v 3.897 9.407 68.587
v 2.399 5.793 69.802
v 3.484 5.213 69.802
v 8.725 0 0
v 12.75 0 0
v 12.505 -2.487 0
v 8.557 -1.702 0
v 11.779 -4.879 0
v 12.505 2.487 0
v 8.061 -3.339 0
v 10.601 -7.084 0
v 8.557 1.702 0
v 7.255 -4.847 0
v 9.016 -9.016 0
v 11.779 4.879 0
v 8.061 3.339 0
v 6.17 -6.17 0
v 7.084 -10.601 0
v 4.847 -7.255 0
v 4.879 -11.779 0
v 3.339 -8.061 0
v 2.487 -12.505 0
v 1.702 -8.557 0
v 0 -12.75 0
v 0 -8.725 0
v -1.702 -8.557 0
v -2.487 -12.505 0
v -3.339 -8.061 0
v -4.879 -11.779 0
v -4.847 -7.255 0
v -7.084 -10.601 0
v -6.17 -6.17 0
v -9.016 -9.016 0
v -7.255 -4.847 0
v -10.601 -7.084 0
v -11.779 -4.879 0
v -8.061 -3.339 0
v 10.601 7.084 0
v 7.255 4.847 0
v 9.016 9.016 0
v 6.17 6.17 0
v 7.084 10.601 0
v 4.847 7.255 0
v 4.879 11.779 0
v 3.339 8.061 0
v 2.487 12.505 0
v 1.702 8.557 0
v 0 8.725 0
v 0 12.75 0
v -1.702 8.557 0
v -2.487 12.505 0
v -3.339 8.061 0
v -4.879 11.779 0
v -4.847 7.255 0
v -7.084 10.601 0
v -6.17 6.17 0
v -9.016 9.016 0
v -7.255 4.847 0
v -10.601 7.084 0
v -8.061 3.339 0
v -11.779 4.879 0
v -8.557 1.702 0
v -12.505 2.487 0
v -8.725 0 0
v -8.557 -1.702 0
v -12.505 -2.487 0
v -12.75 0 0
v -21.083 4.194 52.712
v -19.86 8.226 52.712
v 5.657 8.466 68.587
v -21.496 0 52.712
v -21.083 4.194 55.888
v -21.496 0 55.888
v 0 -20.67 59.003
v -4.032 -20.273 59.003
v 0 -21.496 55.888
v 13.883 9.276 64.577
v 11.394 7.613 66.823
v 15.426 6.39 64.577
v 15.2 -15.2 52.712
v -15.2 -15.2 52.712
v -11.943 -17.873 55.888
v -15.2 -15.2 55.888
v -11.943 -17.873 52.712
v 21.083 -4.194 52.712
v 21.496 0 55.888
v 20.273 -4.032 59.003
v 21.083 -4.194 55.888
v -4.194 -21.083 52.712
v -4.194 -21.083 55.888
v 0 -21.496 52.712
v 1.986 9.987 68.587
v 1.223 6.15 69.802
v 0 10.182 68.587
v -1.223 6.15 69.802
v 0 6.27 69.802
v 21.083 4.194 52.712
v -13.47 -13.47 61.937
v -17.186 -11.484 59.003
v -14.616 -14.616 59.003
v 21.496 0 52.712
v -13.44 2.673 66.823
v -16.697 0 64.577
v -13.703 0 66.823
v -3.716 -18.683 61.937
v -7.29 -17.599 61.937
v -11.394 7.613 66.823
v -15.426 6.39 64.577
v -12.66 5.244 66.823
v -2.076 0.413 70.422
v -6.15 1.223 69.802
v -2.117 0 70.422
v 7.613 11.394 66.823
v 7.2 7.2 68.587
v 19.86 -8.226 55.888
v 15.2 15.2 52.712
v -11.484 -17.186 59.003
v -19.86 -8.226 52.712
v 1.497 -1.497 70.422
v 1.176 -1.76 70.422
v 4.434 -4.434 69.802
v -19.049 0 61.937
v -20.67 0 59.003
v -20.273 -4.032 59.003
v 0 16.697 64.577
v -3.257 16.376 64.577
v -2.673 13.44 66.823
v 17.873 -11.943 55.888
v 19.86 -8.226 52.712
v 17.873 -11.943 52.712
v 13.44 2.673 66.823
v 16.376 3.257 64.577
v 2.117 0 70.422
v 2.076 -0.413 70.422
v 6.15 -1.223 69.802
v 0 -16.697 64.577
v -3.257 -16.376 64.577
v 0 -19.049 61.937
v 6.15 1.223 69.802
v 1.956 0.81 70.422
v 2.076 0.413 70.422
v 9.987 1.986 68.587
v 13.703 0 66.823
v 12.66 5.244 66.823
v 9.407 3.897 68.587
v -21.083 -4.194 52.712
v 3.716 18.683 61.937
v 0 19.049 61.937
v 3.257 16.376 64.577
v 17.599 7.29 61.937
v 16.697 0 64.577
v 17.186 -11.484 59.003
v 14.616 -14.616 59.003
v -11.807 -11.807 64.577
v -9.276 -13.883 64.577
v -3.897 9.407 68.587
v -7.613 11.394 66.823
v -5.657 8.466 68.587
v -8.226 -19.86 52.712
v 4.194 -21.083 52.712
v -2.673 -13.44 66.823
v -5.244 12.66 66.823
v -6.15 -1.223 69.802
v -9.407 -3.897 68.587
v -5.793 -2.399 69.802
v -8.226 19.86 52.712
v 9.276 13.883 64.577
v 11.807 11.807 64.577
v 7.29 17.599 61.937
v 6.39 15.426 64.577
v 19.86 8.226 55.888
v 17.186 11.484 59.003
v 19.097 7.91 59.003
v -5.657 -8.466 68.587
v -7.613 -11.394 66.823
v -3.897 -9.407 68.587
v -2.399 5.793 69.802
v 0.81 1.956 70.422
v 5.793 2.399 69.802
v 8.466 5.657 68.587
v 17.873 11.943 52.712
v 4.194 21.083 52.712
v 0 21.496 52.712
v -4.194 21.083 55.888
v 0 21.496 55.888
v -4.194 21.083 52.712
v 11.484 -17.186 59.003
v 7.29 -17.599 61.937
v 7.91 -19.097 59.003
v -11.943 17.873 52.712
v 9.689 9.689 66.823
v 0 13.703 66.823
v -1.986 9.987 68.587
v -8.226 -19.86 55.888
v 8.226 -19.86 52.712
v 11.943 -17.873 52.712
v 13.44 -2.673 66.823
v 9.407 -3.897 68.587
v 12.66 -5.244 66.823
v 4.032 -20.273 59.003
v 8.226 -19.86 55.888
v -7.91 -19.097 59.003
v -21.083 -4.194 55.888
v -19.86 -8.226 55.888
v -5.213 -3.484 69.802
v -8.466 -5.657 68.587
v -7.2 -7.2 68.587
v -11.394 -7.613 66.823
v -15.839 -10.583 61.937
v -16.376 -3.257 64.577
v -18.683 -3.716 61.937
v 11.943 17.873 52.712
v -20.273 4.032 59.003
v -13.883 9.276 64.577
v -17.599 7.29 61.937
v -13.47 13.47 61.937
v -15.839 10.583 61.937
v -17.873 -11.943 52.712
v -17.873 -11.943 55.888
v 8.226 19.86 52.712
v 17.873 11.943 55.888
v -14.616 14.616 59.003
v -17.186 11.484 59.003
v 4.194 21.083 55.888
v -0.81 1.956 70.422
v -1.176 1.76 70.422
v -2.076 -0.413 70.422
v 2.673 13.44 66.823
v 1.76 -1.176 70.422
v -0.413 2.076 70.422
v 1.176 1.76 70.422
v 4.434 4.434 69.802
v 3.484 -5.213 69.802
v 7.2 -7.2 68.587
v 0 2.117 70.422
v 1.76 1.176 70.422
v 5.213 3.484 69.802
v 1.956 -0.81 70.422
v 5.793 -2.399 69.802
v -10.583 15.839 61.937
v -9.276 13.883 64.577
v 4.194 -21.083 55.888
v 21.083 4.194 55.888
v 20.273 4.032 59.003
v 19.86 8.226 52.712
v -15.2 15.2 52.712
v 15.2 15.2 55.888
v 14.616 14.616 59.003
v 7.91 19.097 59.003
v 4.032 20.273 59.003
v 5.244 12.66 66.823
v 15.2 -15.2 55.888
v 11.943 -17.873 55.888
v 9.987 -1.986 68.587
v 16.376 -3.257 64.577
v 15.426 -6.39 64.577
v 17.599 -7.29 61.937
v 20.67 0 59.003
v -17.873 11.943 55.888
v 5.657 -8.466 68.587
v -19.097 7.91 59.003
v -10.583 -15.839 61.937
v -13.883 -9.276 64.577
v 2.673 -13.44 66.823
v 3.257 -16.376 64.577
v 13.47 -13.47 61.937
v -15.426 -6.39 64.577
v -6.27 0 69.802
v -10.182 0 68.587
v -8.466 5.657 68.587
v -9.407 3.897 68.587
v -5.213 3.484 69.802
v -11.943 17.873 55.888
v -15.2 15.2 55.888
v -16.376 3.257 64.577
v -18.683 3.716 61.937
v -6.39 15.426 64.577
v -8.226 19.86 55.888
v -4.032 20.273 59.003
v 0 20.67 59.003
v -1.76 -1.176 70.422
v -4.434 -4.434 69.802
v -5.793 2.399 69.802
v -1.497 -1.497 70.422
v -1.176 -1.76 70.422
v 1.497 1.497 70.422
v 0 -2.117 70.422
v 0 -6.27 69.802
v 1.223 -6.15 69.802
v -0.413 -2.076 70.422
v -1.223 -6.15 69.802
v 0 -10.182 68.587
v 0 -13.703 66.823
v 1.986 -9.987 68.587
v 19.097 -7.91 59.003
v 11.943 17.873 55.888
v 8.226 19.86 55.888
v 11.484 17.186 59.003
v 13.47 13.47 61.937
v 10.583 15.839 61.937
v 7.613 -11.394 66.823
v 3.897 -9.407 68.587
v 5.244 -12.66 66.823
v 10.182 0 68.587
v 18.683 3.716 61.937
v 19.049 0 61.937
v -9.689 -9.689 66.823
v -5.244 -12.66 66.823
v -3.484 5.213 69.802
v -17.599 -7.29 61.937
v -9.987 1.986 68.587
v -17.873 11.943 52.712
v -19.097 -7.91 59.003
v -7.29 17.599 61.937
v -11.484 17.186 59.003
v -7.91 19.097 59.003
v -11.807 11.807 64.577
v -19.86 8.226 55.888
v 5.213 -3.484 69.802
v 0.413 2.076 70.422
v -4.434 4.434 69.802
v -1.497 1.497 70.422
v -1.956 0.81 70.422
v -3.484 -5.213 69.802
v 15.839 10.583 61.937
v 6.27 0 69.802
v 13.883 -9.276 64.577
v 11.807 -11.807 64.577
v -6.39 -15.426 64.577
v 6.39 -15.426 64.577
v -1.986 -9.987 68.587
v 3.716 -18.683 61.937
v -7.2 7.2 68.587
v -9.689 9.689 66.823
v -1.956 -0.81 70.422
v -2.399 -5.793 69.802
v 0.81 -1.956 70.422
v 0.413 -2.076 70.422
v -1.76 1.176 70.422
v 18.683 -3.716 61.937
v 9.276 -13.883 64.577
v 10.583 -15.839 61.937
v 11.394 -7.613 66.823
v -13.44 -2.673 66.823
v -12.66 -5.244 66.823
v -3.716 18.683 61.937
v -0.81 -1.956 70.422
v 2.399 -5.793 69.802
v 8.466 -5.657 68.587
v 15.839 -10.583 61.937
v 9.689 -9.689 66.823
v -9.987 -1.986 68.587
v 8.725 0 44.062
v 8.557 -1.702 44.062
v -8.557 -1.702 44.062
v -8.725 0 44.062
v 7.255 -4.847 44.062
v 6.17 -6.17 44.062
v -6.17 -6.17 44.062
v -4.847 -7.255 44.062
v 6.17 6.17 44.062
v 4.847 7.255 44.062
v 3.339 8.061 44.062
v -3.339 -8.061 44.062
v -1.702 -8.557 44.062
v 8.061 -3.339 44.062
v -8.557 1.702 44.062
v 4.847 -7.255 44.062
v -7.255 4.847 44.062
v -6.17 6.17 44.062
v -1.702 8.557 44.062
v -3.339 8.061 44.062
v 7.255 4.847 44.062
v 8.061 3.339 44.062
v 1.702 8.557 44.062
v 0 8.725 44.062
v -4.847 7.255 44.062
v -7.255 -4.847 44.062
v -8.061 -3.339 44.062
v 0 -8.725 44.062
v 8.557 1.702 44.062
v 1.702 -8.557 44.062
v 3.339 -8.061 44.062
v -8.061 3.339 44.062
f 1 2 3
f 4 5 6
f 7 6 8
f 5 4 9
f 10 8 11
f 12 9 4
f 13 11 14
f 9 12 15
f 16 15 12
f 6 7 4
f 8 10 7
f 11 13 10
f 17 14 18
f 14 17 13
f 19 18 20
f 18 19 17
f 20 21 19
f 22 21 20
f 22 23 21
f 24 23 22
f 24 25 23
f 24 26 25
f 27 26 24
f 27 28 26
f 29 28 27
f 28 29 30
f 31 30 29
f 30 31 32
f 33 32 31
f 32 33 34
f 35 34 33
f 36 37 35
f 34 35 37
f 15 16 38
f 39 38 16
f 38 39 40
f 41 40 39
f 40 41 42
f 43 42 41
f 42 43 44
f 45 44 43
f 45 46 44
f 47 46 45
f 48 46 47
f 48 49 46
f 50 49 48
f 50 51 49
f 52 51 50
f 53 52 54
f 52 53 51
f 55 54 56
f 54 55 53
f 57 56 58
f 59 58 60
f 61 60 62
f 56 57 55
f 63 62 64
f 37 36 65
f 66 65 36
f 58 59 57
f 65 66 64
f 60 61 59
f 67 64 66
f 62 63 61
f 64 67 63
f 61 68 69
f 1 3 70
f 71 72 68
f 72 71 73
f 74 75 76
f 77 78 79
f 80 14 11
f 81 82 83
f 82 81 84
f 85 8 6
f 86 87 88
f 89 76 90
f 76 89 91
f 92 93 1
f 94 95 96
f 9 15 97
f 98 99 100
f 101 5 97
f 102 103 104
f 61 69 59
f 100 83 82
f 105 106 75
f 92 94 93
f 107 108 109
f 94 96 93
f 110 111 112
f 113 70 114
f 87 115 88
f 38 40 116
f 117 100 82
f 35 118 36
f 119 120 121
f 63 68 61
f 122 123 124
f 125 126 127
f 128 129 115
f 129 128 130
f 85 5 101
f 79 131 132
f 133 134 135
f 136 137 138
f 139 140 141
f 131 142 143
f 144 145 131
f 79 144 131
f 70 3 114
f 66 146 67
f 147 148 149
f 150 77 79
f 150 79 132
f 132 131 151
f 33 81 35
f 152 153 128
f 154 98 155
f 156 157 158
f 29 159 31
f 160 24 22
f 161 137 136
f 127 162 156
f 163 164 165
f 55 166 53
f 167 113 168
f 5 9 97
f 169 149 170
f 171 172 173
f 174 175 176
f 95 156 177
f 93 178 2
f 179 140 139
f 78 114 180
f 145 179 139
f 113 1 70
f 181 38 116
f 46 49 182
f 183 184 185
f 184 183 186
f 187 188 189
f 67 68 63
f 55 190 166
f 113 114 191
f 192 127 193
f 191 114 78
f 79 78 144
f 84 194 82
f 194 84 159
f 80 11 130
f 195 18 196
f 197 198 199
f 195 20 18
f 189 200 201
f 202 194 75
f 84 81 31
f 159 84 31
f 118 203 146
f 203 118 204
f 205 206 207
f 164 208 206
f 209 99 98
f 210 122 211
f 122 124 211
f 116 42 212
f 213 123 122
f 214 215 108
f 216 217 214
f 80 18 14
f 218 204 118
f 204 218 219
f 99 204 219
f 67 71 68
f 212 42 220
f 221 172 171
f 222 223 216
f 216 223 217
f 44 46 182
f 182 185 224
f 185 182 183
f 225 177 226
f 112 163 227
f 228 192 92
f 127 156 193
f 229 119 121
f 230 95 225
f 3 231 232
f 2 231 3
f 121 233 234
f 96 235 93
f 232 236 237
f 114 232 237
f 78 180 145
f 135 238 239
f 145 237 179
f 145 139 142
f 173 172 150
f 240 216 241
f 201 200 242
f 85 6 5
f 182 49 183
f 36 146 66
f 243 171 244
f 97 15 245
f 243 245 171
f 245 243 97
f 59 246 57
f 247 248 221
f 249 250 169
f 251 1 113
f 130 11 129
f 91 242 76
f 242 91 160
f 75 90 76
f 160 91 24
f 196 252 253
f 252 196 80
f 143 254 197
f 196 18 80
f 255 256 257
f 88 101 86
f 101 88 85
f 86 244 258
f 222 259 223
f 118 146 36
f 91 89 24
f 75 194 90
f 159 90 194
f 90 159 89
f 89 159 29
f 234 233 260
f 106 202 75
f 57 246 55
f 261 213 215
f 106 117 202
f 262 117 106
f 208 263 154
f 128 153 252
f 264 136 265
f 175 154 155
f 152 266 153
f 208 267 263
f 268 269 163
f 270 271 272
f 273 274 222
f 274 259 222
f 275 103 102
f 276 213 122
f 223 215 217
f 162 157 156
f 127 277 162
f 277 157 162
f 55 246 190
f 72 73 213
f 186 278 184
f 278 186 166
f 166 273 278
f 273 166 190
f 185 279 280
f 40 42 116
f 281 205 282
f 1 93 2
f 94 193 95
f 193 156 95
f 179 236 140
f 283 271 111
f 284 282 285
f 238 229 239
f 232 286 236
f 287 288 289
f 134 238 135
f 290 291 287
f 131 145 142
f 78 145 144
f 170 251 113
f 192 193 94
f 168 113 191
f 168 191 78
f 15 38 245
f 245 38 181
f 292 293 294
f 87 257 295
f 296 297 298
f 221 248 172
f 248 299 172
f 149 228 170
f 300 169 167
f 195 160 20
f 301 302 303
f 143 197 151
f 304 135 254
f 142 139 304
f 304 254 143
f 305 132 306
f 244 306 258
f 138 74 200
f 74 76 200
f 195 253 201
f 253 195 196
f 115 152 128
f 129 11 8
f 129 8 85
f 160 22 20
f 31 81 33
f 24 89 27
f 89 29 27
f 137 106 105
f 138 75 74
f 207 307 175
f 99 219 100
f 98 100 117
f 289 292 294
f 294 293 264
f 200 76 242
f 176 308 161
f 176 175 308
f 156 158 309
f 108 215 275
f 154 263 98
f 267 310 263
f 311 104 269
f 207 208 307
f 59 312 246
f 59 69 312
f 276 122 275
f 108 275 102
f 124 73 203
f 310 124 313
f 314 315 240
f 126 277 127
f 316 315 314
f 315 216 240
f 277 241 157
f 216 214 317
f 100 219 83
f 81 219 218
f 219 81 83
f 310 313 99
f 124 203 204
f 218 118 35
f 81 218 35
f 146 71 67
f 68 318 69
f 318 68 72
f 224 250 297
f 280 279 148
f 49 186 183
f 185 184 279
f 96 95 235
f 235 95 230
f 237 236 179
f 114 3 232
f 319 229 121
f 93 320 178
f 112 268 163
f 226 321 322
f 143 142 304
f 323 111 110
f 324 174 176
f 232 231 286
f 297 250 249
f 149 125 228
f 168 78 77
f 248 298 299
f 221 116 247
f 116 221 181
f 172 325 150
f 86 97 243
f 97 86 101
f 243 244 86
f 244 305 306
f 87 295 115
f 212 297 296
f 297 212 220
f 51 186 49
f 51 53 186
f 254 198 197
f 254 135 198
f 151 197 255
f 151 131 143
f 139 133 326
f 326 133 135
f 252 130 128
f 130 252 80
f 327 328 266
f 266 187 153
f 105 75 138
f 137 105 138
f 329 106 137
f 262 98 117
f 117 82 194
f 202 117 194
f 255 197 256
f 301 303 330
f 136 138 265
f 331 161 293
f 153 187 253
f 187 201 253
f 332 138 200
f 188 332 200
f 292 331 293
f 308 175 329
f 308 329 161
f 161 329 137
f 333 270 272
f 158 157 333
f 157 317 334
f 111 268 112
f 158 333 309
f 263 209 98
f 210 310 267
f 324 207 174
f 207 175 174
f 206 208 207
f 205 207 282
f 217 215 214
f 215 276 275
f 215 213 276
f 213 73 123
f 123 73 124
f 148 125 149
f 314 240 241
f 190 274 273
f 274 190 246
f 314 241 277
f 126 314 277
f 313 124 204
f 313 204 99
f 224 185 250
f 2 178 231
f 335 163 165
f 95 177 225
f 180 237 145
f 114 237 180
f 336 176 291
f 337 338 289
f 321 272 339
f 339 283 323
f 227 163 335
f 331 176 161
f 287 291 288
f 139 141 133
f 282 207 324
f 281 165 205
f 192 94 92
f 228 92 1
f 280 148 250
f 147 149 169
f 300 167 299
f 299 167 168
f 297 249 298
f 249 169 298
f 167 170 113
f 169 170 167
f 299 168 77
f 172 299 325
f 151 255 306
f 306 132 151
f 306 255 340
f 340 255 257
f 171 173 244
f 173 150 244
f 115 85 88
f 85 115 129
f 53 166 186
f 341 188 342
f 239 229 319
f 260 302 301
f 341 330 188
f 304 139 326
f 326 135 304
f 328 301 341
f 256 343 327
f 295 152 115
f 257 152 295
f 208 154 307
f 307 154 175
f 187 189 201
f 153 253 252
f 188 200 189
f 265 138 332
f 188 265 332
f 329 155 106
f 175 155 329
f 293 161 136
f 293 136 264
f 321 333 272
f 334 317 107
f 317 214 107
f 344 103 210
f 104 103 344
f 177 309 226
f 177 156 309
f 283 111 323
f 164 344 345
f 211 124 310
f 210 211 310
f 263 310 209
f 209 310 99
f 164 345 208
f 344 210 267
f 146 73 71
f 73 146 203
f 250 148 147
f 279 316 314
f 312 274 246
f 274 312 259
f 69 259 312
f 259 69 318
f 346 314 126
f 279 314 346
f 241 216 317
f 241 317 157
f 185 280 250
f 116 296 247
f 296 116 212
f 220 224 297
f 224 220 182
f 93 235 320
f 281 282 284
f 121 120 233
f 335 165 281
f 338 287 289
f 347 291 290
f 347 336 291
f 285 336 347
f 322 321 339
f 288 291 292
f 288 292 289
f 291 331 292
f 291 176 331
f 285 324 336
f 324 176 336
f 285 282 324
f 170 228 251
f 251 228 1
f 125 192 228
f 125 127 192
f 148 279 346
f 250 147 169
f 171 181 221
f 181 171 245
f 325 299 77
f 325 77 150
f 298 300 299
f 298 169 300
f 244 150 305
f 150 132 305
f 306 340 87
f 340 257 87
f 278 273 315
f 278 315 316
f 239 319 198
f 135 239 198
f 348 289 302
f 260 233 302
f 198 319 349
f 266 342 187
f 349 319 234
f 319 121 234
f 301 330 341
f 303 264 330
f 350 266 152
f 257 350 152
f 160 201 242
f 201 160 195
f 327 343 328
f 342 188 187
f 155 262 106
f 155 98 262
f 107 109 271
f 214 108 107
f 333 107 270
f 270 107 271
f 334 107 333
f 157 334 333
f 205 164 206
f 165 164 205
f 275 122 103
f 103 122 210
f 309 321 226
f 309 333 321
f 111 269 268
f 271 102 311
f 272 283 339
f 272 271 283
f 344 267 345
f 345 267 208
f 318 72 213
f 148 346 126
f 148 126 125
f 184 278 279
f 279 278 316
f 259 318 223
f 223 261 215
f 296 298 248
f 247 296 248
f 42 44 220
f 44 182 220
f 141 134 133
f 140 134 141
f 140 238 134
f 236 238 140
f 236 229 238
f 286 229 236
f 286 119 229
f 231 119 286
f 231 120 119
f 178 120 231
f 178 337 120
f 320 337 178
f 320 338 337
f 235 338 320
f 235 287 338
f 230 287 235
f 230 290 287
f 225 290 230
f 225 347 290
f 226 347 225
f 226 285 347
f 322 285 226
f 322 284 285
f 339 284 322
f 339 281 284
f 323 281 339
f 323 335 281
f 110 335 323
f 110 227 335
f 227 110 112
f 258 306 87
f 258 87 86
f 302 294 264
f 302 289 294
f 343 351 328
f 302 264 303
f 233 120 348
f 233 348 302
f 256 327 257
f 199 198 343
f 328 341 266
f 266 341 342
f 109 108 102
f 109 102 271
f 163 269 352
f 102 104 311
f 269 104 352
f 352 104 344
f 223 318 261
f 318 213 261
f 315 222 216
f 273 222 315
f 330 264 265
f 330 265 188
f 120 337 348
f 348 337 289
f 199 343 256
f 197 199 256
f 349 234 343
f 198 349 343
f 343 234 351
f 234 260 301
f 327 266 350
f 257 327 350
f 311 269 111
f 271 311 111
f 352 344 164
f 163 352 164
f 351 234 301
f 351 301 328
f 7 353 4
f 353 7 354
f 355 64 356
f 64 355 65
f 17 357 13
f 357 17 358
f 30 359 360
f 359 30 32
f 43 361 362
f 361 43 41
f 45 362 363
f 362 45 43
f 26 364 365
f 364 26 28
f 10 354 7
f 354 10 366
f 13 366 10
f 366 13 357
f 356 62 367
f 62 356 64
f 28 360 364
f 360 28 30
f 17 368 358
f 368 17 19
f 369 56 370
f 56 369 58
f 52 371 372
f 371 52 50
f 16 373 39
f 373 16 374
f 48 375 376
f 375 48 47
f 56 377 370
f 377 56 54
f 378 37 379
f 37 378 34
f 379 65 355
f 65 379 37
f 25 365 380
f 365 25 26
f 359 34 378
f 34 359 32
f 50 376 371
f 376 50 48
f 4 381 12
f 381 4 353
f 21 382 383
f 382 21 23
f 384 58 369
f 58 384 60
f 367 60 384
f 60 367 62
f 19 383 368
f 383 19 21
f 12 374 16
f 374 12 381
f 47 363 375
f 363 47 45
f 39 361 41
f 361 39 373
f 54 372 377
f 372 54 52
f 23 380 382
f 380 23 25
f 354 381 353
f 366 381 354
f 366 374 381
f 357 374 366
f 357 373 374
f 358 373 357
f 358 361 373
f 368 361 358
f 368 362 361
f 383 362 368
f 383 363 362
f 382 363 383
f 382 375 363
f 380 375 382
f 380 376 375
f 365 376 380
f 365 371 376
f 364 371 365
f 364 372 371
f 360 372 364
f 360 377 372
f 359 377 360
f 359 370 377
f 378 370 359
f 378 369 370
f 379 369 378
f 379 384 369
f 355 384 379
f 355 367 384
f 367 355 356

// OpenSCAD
// Foam missile (for foot launcher)
$fn = 32;

missile_wall_thick = 0.4;
missile_od = 17.4;
missile_id = missile_od - missile_wall_thick;
missile_shaft_len = 210.0;
missile_tip_len = 70.5;
missile_tip_lower_dia = 25.5;
missile_tip_upper_dia = 43.2;
missile_tip_flatness = 0.75; // 1.0 is round, 0.0 is flat
spacing = 0.05;
fin_thick = 8*missile_wall_thick;
fin_len = 20.0;
fin_h = fin_len*2;
num_fins = 3;

module missileShaft2D(do_diff = true) {
    difference() {
        circle(d=missile_od);
        if (do_diff)
            circle(d=missile_id);
    }
}

module missileFin2D() {
    polygon([
        [0, fin_thick/2],
        [fin_len, 0],
        [0, -fin_thick/2]
    ]);
}
//missileFin2D();

module missileFin3D() {
    translate([missile_od/2,0,0])
    linear_extrude(fin_h, scale=0.01)
    missileFin2D();
}
//missileFin3D();

module missileFins3D() {
    for(i=[0:num_fins-1]) {
        rotate([0,0,(360/num_fins)*i])
        missileFin3D();
    }
}
//missileFins3D();

module missileShaft3D(do_diff = true) {
    linear_extrude(missile_wall_thick)
    circle(d=missile_od);
    linear_extrude(missile_shaft_len)
    missileShaft2D(do_diff);
    translate([0,0,missile_shaft_len])
    rotate([180,0,0])
    missileFins3D();
}
//missileShaft3D();

module missileShaftVase3D() {
    missileShaft3D(do_diff=false);
}
//missileShaftVase3D();

module missileSolidTip3D() {
    hull() {
        cylinder(d=missile_tip_lower_dia, h=0.01);
        translate([0,0,missile_tip_len-(missile_tip_upper_dia*missile_tip_flatness)/2])
        scale([1,1,missile_tip_flatness])
        sphere(d=missile_tip_upper_dia);
    }
}
//missileSolidTip3D();

module missileTip3D() {
    difference() {
        missileSolidTip3D();
        linear_extrude((5*missile_tip_len)/8)
        circle(d=missile_od+spacing);
    }
}
missileTip3D();

module missileTipPrintable() {
    translate([0,0,missile_tip_len])
    rotate([180,0,0])
    missileTip3D();
}
//missileTipPrintable();

module fullMissile() {
    translate([0,0,missile_shaft_len-(3*missile_tip_len)/4])
    #missileTip3D();
    translate([0,0,missile_shaft_len])
    rotate([180,0,0])
    missileShaft3D();
}
//fullMissile();
